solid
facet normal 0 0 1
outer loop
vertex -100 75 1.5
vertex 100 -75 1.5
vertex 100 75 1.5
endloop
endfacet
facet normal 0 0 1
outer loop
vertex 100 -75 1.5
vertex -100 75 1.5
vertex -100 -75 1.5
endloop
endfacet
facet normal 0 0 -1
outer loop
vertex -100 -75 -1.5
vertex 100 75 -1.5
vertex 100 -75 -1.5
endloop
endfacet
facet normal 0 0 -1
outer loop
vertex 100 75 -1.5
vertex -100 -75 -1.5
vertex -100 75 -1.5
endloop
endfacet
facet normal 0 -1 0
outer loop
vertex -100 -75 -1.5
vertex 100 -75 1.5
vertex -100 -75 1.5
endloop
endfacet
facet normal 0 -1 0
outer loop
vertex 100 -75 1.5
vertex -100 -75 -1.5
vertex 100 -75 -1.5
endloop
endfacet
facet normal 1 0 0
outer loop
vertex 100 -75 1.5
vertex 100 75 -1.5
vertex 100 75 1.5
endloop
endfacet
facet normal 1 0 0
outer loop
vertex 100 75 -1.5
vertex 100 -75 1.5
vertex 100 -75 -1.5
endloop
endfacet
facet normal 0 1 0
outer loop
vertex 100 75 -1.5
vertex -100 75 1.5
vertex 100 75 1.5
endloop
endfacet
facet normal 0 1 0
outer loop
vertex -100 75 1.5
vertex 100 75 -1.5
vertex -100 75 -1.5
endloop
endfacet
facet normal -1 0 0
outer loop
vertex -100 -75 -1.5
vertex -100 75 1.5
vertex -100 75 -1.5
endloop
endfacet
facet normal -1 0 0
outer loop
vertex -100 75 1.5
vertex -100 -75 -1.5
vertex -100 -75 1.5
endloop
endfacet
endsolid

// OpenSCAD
$fn = 64;

length = 200;
width  = 150;
thickness = 3;

// Ensure a visible, centered, single connected solid (acrylic sheet)
color([0.85, 0.95, 1.0, 0.25])
cube([length, width, thickness], center=true);
